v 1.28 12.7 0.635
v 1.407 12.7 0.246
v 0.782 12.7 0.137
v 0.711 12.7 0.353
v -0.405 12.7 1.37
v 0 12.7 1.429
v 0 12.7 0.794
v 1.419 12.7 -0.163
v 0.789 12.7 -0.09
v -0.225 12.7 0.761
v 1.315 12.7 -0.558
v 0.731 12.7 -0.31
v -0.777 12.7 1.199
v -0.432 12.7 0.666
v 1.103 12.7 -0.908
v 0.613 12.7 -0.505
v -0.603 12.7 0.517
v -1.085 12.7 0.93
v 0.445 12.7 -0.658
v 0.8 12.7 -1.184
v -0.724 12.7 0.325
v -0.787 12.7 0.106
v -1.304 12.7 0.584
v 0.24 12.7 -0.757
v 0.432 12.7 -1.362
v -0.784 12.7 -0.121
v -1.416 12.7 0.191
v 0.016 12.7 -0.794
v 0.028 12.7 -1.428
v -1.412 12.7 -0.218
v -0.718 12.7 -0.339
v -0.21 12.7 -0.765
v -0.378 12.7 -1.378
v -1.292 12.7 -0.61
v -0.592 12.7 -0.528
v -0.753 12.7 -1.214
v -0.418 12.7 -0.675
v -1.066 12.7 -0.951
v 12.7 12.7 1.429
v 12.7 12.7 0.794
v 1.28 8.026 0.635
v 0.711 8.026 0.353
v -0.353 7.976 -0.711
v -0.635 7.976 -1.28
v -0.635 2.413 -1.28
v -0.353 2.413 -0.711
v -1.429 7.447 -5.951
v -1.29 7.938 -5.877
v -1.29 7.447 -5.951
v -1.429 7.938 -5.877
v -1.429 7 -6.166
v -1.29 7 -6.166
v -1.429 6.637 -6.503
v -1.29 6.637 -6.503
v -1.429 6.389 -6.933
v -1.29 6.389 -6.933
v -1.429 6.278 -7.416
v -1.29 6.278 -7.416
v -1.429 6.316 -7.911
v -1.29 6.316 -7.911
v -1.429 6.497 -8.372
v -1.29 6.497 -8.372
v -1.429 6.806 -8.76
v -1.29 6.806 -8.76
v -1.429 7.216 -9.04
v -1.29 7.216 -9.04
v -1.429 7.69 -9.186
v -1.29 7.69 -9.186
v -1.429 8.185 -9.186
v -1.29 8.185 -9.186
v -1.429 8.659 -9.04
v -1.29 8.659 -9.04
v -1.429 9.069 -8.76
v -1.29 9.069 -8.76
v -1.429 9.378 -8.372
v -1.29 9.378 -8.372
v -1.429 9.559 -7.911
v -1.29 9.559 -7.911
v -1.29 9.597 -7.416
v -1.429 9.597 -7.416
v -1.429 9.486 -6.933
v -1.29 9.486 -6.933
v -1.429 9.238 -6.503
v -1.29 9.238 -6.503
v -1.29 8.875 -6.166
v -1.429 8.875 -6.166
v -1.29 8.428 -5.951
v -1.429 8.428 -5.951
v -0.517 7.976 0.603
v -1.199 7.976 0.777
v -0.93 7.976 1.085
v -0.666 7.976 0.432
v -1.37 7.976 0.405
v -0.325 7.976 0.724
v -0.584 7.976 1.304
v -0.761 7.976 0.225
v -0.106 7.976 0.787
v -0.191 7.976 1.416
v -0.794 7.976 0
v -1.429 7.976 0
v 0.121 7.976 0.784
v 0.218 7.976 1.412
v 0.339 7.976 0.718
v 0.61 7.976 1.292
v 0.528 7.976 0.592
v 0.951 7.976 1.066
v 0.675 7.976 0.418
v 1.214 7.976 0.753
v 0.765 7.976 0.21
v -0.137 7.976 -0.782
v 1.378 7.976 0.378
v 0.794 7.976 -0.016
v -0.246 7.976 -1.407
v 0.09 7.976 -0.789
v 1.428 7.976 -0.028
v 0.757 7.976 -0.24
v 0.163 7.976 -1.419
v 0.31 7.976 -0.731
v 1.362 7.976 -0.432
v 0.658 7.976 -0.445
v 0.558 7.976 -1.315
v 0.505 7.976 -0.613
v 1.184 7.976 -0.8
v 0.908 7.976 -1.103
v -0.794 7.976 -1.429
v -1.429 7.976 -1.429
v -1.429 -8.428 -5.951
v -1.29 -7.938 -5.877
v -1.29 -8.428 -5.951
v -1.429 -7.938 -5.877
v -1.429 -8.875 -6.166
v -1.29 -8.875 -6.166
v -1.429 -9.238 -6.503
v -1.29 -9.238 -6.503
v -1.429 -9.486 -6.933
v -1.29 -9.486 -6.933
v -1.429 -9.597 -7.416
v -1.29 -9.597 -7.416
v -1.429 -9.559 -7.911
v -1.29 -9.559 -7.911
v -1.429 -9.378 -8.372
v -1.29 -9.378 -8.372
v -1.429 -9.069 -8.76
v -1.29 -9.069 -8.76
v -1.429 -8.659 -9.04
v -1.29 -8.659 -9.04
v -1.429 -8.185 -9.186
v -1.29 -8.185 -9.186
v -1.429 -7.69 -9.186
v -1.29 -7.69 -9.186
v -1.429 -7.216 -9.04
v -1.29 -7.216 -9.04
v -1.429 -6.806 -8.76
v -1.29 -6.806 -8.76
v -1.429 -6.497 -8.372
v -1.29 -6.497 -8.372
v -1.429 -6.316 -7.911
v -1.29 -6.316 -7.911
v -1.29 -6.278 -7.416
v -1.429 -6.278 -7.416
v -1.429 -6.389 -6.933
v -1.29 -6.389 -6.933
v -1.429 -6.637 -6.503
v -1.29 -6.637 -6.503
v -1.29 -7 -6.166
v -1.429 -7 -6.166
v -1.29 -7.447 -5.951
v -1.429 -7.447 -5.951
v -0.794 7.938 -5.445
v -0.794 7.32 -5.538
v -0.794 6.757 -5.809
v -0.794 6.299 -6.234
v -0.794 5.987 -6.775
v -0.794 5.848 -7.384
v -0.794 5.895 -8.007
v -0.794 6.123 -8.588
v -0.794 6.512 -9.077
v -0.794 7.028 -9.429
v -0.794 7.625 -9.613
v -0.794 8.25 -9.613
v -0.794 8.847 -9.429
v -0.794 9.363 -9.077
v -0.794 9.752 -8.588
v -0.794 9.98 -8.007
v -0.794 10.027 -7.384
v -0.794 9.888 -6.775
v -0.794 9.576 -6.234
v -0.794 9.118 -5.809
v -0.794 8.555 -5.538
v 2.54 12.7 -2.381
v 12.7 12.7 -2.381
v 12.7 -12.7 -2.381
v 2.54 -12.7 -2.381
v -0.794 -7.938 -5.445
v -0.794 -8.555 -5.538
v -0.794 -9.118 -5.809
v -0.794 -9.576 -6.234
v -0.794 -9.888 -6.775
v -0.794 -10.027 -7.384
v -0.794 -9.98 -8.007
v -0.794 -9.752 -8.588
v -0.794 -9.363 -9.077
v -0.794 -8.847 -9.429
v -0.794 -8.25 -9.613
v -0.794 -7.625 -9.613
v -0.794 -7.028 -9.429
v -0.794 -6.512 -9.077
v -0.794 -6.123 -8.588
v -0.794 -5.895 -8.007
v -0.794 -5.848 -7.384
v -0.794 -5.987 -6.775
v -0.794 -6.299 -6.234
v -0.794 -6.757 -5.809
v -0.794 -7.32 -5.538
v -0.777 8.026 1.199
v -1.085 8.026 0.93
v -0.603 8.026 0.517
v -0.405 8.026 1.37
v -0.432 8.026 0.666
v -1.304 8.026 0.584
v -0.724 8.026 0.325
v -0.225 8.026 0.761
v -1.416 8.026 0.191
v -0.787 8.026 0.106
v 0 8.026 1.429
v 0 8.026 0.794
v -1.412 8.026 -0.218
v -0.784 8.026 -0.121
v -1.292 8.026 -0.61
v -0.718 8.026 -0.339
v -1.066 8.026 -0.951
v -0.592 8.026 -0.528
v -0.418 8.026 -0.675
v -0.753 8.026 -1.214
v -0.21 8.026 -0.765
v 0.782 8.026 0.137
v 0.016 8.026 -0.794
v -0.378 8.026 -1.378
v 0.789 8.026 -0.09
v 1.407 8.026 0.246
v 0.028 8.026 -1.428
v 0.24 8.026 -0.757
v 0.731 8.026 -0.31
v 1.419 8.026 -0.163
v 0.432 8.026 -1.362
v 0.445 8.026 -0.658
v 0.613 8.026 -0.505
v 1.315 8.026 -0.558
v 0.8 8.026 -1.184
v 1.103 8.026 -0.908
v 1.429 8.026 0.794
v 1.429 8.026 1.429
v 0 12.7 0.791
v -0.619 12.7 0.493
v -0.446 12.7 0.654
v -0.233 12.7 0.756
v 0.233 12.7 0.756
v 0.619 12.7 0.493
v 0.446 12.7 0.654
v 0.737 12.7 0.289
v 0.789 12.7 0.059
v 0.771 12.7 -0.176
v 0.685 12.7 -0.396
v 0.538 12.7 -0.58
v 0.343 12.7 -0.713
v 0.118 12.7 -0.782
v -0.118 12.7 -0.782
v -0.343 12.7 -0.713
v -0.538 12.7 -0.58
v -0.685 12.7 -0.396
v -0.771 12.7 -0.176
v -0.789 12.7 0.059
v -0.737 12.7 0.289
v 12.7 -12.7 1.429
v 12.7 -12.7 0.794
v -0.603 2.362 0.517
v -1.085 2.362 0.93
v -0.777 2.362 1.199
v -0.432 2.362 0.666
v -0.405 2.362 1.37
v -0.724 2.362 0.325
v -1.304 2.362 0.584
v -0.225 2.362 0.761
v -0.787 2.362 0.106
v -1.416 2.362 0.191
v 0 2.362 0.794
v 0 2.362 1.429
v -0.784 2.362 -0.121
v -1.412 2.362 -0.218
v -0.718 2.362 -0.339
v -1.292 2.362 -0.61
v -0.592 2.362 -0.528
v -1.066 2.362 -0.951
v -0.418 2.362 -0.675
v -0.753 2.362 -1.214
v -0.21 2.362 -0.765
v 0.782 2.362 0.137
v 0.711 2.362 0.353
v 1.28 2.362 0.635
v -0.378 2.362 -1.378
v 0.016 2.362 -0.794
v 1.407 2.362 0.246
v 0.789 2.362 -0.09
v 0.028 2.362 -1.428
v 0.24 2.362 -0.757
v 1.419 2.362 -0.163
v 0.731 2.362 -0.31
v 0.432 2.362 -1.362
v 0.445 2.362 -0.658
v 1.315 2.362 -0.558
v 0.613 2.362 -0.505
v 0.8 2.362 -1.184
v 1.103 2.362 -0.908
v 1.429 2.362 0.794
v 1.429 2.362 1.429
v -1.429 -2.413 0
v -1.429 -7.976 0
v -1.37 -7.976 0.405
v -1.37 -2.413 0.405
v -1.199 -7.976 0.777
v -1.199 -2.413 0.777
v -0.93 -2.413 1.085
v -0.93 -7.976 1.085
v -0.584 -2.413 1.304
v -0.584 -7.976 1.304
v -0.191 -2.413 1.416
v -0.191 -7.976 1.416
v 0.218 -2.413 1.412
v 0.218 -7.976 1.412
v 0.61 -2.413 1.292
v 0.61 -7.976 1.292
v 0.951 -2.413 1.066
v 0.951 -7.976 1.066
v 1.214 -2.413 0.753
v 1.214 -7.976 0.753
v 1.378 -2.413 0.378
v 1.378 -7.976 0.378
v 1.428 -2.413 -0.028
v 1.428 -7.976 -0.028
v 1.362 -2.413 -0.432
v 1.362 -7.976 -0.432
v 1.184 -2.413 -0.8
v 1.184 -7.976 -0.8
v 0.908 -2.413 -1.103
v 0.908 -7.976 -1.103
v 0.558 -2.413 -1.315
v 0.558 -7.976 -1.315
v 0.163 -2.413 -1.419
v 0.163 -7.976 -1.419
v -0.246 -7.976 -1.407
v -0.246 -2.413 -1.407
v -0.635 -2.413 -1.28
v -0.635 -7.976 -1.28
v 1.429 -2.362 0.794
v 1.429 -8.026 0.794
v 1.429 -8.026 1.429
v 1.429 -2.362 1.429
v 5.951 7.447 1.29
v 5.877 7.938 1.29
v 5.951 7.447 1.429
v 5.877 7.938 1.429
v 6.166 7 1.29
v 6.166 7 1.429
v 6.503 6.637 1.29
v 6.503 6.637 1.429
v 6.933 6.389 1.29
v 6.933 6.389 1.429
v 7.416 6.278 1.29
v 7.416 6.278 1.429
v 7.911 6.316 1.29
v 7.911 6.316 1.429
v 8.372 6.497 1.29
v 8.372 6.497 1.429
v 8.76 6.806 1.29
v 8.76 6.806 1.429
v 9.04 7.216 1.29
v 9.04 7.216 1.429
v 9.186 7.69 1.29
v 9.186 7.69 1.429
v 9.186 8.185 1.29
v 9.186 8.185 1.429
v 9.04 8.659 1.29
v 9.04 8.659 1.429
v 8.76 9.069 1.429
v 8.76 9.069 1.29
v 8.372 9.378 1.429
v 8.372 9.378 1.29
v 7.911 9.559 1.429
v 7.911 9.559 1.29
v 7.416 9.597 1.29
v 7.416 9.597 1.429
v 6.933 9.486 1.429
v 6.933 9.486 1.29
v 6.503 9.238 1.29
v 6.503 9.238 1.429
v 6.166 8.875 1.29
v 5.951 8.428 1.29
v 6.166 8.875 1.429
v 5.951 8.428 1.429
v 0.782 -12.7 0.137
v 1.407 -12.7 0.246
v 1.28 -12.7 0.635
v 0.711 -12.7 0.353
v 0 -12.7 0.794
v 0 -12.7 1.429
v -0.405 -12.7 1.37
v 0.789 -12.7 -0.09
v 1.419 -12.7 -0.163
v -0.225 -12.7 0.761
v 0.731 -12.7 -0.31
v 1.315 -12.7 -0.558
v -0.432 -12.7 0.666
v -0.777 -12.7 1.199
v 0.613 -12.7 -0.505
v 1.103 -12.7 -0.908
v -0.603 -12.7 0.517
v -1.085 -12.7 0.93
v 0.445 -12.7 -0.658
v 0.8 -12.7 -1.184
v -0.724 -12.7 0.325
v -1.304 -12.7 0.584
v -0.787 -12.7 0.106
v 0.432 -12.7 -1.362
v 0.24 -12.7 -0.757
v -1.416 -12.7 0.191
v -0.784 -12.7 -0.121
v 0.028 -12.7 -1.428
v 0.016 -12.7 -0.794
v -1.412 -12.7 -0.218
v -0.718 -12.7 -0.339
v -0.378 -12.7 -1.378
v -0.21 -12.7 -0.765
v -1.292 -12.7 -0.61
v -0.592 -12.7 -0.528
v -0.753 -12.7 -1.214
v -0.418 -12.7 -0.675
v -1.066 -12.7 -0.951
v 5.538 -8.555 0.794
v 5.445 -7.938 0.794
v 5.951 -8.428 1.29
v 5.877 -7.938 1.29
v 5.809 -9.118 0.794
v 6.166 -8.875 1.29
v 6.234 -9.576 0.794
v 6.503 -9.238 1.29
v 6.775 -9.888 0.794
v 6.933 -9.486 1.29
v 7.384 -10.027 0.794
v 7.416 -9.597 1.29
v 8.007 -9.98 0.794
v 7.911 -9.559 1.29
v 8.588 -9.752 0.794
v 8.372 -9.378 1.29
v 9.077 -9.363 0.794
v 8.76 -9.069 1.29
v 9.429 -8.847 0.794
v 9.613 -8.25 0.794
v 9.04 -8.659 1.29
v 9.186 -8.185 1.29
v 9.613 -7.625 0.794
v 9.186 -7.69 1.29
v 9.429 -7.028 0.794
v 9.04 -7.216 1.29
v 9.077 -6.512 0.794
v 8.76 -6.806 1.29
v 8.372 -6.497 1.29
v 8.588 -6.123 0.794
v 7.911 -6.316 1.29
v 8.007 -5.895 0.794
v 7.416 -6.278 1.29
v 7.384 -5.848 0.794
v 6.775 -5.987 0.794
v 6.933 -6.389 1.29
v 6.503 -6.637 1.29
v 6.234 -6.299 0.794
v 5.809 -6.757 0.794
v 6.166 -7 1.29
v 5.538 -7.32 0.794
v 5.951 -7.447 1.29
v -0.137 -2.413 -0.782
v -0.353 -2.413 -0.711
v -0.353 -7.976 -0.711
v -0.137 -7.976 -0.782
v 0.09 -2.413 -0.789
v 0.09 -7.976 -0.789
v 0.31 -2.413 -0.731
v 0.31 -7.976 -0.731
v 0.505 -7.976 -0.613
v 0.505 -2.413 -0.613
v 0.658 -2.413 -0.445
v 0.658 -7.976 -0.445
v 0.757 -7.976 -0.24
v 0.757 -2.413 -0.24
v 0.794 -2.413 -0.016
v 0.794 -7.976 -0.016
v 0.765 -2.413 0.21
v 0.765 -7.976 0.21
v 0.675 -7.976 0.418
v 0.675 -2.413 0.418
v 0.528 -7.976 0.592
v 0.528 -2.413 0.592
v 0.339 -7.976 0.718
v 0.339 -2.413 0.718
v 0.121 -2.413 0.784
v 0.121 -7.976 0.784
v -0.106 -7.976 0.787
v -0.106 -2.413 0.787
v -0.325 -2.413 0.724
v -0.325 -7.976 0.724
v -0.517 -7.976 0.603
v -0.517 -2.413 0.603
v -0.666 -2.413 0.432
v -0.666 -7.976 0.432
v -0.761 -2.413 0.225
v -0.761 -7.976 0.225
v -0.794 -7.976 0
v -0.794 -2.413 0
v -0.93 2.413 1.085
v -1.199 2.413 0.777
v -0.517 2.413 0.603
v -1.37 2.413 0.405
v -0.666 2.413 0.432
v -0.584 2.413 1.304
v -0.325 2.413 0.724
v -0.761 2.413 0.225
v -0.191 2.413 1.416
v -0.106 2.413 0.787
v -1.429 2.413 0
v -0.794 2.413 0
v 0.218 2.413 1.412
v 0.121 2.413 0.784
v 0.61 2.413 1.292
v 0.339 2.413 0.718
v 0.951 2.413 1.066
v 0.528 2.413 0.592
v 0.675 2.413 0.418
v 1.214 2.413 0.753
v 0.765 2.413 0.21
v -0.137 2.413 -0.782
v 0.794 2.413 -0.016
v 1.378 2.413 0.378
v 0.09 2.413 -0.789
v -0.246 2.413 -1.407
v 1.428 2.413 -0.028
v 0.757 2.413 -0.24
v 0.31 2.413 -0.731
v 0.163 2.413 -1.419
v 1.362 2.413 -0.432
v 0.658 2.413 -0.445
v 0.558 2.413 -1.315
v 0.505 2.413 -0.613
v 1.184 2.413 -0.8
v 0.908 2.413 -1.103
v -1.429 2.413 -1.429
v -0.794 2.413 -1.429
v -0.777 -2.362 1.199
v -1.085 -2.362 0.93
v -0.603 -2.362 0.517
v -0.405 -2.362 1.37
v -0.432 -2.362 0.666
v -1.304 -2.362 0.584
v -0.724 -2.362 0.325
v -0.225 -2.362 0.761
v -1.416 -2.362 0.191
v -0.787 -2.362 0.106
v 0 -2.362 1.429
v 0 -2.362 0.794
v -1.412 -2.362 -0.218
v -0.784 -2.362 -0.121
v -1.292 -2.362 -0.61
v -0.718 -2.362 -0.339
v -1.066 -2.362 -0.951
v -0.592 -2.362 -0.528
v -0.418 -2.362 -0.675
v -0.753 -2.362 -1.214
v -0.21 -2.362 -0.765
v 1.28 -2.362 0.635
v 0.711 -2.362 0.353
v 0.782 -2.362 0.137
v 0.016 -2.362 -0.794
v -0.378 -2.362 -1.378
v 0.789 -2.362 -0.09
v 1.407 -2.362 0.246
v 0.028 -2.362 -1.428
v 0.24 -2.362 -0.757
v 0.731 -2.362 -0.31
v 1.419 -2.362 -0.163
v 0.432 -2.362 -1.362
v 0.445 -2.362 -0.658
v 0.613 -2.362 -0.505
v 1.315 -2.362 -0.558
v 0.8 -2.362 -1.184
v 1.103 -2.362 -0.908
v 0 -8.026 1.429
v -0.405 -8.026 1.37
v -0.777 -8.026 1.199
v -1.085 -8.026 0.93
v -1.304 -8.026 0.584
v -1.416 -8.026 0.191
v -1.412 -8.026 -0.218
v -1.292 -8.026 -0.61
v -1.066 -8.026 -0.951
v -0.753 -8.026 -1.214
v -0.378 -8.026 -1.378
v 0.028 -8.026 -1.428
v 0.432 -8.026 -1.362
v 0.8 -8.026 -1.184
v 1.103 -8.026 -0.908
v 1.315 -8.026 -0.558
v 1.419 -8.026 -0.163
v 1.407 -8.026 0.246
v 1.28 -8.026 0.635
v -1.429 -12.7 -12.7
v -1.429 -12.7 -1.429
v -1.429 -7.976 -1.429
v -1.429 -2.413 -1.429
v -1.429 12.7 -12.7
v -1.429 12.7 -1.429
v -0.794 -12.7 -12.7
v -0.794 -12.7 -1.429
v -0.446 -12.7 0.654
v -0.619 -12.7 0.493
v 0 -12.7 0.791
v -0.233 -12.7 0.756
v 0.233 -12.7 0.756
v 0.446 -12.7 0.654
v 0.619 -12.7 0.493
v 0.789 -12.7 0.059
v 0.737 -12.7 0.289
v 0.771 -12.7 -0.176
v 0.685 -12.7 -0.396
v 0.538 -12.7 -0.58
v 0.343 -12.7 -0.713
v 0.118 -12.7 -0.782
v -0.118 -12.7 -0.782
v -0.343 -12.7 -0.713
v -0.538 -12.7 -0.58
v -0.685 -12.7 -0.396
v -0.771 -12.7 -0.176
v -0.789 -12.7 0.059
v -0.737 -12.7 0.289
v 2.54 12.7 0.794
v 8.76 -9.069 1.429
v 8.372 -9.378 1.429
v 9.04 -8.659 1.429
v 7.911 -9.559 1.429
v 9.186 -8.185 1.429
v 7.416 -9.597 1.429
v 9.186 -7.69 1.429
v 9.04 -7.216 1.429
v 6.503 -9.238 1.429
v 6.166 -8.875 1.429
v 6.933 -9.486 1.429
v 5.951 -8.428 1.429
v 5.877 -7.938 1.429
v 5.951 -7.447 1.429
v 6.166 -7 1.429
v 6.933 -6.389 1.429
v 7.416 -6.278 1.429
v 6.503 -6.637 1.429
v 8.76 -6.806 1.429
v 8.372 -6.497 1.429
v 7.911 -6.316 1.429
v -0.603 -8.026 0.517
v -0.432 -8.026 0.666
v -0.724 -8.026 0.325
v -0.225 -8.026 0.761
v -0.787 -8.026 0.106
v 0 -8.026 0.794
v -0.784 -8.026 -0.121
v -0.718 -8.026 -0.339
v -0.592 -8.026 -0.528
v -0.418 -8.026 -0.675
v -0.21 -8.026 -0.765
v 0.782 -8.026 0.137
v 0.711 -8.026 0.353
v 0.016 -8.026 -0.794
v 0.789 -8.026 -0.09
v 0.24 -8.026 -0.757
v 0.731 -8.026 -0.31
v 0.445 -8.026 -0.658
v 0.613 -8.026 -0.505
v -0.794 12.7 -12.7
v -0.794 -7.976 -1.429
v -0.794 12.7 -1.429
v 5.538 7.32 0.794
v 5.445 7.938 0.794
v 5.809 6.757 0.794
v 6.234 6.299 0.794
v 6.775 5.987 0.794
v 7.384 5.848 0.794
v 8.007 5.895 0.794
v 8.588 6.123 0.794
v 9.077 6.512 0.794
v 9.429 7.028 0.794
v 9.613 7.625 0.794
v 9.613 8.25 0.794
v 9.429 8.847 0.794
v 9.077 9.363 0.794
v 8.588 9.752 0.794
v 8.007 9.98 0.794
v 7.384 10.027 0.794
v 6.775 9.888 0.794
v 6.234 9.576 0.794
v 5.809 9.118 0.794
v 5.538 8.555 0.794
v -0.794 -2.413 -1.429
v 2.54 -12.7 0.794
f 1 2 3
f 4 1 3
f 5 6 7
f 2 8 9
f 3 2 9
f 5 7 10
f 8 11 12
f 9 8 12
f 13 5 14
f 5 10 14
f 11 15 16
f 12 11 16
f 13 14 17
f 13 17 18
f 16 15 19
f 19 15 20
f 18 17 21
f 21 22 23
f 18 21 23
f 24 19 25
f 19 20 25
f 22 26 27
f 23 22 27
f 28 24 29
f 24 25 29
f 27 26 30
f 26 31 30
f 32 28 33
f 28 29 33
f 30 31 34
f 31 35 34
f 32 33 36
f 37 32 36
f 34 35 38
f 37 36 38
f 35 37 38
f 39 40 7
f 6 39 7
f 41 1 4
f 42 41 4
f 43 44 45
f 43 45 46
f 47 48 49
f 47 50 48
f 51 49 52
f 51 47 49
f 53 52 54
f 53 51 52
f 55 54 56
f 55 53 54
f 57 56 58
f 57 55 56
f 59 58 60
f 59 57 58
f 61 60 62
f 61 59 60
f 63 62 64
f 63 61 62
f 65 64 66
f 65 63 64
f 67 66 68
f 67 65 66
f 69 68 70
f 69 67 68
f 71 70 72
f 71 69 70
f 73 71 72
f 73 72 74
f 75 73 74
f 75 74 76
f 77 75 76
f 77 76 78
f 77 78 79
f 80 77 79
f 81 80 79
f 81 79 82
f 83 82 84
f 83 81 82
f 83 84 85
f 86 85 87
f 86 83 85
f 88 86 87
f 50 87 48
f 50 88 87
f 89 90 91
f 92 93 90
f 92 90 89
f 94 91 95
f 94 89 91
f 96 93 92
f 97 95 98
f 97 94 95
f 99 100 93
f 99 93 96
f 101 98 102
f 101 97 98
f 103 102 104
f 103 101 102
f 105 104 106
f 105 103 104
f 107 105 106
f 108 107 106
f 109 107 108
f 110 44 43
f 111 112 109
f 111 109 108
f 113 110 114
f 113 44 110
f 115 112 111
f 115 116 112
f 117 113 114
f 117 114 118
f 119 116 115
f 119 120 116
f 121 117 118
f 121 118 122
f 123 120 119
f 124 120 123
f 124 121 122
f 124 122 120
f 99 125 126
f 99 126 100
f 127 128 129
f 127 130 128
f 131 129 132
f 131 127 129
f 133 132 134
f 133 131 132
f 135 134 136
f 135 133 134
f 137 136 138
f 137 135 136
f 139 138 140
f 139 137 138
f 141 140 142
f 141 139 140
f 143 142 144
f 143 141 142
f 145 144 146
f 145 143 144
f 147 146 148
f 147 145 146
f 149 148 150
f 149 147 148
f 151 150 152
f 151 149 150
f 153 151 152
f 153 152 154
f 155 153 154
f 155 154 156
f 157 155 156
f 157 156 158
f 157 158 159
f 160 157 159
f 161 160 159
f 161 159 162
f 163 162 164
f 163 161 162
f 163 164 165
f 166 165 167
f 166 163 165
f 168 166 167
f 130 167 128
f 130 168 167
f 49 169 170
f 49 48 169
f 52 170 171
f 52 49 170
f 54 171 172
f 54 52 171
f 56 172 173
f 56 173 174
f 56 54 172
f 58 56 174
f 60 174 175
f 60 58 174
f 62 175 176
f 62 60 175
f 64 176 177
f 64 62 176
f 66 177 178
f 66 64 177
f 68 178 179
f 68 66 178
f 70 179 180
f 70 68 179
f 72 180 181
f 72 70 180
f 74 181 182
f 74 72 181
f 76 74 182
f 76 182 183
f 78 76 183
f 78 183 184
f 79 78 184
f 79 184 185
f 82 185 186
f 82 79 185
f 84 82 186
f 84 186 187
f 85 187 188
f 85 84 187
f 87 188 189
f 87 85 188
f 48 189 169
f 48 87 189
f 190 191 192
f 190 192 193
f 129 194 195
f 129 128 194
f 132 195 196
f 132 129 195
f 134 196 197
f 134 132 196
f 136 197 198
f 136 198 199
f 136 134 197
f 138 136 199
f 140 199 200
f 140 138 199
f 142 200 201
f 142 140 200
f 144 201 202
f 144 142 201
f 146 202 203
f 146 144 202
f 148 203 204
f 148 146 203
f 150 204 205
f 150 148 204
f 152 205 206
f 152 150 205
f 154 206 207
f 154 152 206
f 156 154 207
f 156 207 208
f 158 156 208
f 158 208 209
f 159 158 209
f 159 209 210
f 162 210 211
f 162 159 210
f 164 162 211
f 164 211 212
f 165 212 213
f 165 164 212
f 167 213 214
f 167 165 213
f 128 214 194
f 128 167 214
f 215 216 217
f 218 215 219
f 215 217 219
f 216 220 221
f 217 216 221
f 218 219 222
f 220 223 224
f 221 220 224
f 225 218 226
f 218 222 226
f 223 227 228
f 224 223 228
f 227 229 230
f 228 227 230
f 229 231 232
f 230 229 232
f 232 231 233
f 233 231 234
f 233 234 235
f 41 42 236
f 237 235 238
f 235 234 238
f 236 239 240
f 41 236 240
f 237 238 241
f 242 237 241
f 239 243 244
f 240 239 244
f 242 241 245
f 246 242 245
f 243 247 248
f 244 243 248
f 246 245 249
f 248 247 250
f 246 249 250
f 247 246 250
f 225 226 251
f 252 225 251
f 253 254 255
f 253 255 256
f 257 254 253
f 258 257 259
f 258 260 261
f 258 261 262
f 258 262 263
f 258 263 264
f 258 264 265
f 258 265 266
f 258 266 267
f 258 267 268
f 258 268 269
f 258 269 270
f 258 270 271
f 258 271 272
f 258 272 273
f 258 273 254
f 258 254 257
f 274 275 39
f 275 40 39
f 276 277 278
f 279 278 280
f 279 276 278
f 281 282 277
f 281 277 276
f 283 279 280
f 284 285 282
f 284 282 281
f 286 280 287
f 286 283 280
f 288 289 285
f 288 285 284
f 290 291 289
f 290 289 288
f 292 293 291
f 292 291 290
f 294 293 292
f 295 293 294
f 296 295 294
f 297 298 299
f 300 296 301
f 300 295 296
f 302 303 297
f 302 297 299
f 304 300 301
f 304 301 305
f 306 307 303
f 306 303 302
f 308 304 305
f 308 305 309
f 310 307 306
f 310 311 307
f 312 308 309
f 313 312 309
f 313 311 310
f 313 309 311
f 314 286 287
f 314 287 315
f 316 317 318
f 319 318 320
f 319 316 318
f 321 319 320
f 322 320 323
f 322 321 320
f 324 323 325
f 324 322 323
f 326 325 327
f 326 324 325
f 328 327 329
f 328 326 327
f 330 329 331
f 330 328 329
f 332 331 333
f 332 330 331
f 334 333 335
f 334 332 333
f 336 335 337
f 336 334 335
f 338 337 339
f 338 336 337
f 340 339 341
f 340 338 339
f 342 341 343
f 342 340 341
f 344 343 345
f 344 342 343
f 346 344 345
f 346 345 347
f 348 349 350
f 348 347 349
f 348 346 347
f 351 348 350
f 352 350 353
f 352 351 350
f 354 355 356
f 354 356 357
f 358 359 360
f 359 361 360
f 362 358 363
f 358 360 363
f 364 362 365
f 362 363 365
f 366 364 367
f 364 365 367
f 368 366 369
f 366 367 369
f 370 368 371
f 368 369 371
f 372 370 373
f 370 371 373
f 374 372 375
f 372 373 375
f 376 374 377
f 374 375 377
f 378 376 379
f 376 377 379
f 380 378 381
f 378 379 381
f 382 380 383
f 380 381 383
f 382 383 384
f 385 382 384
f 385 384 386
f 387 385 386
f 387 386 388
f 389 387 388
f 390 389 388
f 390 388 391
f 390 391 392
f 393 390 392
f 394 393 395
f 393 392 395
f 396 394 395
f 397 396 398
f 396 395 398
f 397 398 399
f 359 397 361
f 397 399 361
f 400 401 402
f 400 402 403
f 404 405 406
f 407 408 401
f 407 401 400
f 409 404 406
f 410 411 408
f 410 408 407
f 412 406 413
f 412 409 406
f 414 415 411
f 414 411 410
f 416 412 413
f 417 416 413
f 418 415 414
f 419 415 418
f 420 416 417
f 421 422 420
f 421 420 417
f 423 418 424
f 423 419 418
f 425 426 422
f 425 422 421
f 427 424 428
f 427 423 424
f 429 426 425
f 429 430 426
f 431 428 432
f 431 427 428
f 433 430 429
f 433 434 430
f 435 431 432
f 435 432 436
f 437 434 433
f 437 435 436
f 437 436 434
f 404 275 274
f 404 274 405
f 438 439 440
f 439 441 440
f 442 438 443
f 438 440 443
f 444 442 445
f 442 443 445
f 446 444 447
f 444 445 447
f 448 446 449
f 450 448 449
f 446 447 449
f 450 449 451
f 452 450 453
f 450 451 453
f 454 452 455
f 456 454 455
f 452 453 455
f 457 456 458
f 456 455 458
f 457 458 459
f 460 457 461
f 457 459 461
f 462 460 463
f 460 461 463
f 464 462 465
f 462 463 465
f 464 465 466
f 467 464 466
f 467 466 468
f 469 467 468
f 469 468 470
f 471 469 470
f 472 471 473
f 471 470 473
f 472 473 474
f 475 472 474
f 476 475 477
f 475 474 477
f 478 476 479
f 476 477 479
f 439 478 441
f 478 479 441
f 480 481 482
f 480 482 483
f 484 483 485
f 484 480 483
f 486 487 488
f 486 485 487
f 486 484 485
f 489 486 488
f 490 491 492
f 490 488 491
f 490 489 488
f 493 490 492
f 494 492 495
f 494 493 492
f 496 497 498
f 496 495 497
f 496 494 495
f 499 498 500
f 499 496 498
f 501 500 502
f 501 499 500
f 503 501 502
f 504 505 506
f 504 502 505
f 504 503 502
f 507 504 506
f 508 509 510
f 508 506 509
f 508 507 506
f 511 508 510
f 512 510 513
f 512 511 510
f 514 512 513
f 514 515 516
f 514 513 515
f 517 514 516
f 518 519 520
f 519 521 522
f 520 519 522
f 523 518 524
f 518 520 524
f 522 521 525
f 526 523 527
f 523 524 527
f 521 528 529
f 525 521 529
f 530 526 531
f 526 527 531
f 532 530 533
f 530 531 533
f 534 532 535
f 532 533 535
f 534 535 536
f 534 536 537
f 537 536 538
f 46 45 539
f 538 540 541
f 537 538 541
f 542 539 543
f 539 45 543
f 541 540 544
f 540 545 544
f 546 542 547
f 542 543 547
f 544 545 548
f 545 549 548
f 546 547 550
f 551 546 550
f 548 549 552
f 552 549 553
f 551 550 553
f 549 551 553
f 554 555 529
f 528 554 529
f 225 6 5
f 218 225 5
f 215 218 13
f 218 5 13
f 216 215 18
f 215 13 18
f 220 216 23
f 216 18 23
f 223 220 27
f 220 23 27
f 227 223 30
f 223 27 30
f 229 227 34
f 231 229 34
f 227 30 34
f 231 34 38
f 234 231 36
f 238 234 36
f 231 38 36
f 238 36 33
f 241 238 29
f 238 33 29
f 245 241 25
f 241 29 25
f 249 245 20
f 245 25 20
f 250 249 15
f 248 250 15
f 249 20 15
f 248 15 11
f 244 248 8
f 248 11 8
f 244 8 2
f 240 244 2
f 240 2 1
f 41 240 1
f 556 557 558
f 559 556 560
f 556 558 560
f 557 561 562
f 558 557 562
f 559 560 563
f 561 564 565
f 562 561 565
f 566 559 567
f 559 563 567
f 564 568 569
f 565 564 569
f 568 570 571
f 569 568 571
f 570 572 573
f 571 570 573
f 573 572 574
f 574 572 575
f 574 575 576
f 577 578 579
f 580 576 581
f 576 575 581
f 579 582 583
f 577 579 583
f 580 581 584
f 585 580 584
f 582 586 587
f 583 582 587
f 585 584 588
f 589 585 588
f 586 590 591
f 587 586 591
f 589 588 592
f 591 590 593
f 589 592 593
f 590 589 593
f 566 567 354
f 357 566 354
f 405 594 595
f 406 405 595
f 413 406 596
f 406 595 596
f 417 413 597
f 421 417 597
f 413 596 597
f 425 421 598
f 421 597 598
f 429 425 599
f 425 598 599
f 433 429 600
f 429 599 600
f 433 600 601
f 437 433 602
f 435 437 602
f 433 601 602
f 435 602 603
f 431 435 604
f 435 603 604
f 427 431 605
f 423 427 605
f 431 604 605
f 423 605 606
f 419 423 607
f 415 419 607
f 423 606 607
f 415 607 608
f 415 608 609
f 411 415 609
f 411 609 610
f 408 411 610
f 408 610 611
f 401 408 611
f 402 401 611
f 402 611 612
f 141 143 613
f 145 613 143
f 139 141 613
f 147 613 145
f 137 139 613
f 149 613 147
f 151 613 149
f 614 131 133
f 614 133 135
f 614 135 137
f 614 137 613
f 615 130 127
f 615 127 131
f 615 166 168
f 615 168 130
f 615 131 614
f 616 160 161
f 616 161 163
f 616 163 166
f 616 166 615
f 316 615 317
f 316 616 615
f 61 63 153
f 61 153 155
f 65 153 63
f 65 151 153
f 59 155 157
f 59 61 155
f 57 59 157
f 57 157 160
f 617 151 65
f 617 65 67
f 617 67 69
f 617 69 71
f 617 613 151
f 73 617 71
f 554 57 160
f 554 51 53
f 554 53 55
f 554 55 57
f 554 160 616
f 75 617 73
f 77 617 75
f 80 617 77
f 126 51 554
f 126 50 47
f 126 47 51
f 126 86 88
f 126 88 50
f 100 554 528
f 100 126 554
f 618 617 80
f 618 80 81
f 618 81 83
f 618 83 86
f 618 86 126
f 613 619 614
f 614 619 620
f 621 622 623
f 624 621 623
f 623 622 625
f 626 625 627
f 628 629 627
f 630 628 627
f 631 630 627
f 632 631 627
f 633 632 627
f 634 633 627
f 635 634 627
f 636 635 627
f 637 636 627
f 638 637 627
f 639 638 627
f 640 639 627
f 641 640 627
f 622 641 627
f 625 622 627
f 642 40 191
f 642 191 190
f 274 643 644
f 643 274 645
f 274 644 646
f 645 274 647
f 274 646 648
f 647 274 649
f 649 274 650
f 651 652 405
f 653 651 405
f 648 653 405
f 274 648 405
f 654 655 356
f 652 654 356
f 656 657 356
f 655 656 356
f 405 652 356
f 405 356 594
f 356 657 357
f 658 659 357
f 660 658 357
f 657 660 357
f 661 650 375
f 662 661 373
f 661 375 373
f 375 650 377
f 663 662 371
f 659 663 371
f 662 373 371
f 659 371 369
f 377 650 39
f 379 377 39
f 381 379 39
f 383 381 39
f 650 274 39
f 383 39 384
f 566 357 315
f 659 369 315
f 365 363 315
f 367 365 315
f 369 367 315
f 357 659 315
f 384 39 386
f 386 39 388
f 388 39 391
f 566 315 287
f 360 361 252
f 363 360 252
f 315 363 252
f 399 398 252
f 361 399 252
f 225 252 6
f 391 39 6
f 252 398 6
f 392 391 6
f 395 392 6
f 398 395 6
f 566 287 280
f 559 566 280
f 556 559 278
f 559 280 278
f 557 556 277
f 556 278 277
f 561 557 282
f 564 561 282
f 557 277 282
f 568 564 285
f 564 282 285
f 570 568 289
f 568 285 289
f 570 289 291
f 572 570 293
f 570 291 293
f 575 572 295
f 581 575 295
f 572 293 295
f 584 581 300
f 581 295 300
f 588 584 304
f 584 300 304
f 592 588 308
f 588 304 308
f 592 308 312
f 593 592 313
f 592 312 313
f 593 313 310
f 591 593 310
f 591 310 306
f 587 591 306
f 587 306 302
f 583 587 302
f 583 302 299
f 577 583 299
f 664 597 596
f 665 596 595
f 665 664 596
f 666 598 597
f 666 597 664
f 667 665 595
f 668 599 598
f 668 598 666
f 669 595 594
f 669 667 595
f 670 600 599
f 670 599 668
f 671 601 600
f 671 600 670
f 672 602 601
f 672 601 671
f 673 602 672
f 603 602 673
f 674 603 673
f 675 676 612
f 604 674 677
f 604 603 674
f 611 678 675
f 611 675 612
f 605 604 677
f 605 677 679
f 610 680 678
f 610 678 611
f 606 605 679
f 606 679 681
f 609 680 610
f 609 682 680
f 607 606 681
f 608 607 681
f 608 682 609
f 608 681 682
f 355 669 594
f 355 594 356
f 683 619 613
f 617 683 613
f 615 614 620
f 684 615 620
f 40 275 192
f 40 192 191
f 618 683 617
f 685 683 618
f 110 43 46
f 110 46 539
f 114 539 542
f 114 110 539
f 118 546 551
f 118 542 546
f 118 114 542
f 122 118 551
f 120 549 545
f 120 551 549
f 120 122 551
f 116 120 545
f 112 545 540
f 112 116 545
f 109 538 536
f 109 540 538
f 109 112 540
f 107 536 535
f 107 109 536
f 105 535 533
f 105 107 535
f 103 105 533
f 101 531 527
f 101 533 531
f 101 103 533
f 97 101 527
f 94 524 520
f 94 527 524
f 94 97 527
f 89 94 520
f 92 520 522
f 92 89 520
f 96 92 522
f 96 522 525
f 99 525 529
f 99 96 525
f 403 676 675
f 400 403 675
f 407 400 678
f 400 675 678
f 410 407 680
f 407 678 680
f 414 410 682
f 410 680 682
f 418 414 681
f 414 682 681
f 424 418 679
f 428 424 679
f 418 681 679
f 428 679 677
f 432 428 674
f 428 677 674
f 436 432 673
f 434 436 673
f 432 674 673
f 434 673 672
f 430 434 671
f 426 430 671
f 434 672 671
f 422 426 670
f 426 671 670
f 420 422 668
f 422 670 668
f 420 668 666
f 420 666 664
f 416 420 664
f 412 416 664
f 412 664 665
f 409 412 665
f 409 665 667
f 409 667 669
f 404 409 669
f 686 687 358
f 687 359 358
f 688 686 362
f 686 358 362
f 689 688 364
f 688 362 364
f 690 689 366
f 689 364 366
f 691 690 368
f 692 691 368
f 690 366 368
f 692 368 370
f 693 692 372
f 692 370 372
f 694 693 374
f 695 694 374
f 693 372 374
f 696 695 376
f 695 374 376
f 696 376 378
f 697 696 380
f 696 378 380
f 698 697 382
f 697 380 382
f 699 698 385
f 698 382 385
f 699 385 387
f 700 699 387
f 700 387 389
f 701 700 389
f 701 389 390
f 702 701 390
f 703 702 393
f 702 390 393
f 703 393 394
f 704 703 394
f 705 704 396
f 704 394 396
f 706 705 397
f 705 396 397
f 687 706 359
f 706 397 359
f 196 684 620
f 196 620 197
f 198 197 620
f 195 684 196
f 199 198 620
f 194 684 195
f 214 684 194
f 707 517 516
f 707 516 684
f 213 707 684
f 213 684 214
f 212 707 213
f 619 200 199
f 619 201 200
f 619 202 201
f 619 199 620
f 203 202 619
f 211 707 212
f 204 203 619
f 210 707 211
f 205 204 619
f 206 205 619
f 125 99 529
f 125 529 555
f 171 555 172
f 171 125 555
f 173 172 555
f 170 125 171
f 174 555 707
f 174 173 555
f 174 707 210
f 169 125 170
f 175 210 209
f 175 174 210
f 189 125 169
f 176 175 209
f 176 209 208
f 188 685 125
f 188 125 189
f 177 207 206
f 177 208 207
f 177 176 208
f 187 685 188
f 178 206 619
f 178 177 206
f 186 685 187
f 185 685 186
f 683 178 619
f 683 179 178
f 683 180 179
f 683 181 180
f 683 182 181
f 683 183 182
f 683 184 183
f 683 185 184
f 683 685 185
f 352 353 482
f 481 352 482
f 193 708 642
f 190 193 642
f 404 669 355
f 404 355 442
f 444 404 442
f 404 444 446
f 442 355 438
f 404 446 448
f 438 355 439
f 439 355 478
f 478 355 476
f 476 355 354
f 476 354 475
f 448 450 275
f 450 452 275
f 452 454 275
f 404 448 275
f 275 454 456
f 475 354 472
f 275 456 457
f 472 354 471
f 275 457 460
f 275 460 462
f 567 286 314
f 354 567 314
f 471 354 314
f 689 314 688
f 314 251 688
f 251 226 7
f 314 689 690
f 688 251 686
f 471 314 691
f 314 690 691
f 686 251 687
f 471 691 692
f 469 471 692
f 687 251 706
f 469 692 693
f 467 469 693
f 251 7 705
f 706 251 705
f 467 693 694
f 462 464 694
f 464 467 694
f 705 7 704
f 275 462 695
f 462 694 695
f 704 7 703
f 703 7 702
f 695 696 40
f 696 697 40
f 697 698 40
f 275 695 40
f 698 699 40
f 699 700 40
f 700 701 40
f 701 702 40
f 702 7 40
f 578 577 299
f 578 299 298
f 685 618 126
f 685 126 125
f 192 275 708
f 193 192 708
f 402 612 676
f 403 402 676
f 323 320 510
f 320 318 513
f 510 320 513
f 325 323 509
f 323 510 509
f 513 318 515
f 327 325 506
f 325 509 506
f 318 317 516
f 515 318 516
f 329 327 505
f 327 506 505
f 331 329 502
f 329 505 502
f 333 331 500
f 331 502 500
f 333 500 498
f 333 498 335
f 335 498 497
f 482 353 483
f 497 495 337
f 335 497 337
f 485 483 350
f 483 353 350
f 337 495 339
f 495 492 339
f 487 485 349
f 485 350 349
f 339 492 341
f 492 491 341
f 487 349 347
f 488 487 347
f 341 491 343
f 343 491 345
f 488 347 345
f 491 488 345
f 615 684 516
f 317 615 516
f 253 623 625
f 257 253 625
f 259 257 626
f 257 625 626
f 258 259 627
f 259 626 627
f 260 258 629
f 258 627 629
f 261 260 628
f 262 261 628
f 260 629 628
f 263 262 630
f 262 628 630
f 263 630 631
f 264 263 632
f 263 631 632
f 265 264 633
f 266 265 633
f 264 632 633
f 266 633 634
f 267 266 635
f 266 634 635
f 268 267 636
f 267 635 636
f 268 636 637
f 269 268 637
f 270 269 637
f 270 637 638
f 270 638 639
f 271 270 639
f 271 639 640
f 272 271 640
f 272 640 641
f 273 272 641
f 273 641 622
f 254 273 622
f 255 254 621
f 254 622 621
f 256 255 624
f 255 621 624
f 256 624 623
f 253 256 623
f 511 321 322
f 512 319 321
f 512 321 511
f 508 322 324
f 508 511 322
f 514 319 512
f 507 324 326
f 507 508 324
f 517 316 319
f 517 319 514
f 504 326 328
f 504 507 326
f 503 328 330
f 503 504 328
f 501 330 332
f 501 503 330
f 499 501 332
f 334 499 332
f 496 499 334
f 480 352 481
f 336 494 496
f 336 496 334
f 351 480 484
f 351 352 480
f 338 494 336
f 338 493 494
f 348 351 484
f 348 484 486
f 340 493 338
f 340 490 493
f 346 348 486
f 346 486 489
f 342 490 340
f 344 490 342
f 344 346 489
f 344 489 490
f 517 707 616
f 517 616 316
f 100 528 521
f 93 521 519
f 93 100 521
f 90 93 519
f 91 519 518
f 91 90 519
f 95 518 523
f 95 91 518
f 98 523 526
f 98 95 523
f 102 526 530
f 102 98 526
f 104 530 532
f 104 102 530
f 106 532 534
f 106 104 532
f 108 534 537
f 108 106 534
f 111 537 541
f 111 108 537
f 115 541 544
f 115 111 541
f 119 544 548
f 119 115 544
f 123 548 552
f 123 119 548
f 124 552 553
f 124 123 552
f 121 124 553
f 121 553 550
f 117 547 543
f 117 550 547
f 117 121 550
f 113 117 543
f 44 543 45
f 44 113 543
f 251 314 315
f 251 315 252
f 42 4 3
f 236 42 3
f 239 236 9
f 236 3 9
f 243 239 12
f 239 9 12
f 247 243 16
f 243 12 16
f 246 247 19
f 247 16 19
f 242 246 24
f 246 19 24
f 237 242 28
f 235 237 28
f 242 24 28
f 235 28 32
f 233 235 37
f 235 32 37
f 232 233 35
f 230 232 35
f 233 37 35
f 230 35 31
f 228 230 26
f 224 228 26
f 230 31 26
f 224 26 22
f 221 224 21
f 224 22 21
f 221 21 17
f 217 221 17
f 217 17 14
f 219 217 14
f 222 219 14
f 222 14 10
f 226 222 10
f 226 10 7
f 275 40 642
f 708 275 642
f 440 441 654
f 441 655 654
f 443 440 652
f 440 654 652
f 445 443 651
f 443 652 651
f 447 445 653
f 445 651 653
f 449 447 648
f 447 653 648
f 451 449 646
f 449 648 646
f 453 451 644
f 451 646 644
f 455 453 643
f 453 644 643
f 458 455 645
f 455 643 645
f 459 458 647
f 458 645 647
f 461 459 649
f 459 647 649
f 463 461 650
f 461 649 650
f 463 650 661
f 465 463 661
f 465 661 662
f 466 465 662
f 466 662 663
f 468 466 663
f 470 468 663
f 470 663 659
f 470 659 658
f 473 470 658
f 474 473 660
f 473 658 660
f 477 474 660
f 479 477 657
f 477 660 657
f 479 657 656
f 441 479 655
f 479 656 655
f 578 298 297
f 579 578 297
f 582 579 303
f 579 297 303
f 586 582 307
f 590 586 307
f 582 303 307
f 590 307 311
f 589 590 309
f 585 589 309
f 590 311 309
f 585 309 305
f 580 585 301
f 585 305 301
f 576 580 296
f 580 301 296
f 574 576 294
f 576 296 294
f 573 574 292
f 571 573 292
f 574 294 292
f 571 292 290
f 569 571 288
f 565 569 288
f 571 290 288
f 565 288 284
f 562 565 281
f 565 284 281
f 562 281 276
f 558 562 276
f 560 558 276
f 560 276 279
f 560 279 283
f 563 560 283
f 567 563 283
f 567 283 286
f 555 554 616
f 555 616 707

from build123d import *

# Parameters (mm, degrees)
EXTRUDE1_DEPTH          = 12.7
LPATTERN2_COUNT         = 2
LPATTERN2_PITCH         = 15.875
CUT_EXTRUDE1_DEPTH      = 22.997045256
CUT_EXTRUDE1_DEPTH_BACK = 22.997045256
SKETCH4_W               = 2.8575
SKETCH4_H               = 5.6642
CUT_EXTRUDE2_DEPTH      = 1.42875
CUT_EXTRUDE2_DEPTH_BACK = 1.42875
SKETCH5_W               = 2.8575
SKETCH5_H               = 4.7244
SKETCH5_H_2             = 4.826
EXTRUDE2_START          = -12.7
SKETCH6_R               = 0.79121
EXTRUDE2_DEPTH          = 25.4
SKETCH9_W               = 10.16
SKETCH9_H               = 25.4
BOSS_EXTRUDE1_DEPTH     = 3.175


with BuildPart() as part:
    # Sketch1 → Extrude1 (new, symmetric)
    with BuildSketch(Plane(origin=(0, 0, 0), x_dir=(1, 0, 0), z_dir=(0, 1, 0))):
        with BuildLine():
            Line((0, -0.79375), (12.7, -0.79375))
            Line((12.7, -0.79375), (12.7, -1.42875))
            Line((12.7, -1.42875), (0, -1.42875))
            ThreePointArc((0, -1.42875), (-0.753017368, 1.214204022), (1.279883418, -0.635))
            Line((1.279883418, -0.635), (0.711046343, -0.352777778))
            ThreePointArc((0.711046343, -0.352777778), (-0.418342982, 0.67455779), (0, -0.79375))
        make_face()
    extrude(amount=EXTRUDE1_DEPTH, both=True)

    # Sketch7 → Cut-Revolve1 (revolve, cut)
    with BuildSketch(Plane(origin=(7.540625, 0, 0), x_dir=(0, 0, -1), z_dir=(1, 0, 0)), mode=Mode.PRIVATE) as cut_revolve1_sk:
        Polygon((-0.79375, 7.9375), (-0.79375, 10.033), (-1.290479078, 9.6012), (-1.42875, 9.6012), (-1.42875, 7.9375), align=None)
    cut_revolve1 = revolve(cut_revolve1_sk.sketch.rotate(Axis((7.540625, 7.9375, -1.822321443), (0, 0, 1)), 90), axis=Axis((7.540625, 7.9375, -1.822321443), (0, 0, 1)), mode=Mode.SUBTRACT)

    # LPattern2: Cut-Revolve1 ×2
    with Locations(*[(0, -i * LPATTERN2_PITCH, 0) for i in range(1, LPATTERN2_COUNT)]):
        add(cut_revolve1, mode=Mode.SUBTRACT)


with BuildPart() as body_2:
    # Mirror2: mirrored copy
    add(part.part.mirror(Plane(origin=(0, 0, 0), x_dir=(-0.7071067811865439, 0, 0.7071067811865512), z_dir=(0.7071067811865513, 0, 0.7071067811865438))))

    # Sketch5 → Cut-Extrude2 (cut, two sides: drawn at the far end of the back side and taken through both)
    with BuildSketch(Plane.XY.offset(-CUT_EXTRUDE2_DEPTH_BACK)):
        with Locations((0, -10.3378)):
            Rectangle(SKETCH5_W, SKETCH5_H)
        Rectangle(SKETCH5_W, SKETCH5_H_2)
        with Locations((0, 10.3378)):
            Rectangle(SKETCH5_W, SKETCH5_H)
    extrude(amount=CUT_EXTRUDE2_DEPTH + CUT_EXTRUDE2_DEPTH_BACK, mode=Mode.SUBTRACT)


with BuildPart() as part_1:
    add(part.part)

    # Sketch4 → Cut-Extrude1 (cut, two sides: drawn at the far end of the back side and taken through both)
    with BuildSketch(Plane.XY.offset(-CUT_EXTRUDE1_DEPTH_BACK)):
        with Locations((0, 5.1943)):
            Rectangle(SKETCH4_W, SKETCH4_H)
        with Locations((0, -5.1943)):
            Rectangle(SKETCH4_W, SKETCH4_H)
    extrude(amount=CUT_EXTRUDE1_DEPTH + CUT_EXTRUDE1_DEPTH_BACK, mode=Mode.SUBTRACT)


with BuildPart() as body_3:
    # Sketch6 → Extrude2 (new body)
    with BuildSketch(Plane(origin=(0, 0, 0), x_dir=(1, 0, 0), z_dir=(0, 1, 0)).offset(EXTRUDE2_START)):
        with Locations(Location((0, 0, 0), (0, 0, 270))):
            Circle(SKETCH6_R)
    extrude(amount=EXTRUDE2_DEPTH)


with BuildPart() as body_4:
    # Sketch9 → Boss-Extrude1 (new body)
    with BuildSketch(Plane(origin=(0, 0, 0.79375), x_dir=(-1, 0, 0), z_dir=(0, 0, -1))):
        with Locations((-7.62, 0)):
            Rectangle(SKETCH9_W, SKETCH9_H)
    extrude(amount=BOSS_EXTRUDE1_DEPTH)


solid = Compound([body_2.part, part_1.part, body_3.part, body_4.part])
